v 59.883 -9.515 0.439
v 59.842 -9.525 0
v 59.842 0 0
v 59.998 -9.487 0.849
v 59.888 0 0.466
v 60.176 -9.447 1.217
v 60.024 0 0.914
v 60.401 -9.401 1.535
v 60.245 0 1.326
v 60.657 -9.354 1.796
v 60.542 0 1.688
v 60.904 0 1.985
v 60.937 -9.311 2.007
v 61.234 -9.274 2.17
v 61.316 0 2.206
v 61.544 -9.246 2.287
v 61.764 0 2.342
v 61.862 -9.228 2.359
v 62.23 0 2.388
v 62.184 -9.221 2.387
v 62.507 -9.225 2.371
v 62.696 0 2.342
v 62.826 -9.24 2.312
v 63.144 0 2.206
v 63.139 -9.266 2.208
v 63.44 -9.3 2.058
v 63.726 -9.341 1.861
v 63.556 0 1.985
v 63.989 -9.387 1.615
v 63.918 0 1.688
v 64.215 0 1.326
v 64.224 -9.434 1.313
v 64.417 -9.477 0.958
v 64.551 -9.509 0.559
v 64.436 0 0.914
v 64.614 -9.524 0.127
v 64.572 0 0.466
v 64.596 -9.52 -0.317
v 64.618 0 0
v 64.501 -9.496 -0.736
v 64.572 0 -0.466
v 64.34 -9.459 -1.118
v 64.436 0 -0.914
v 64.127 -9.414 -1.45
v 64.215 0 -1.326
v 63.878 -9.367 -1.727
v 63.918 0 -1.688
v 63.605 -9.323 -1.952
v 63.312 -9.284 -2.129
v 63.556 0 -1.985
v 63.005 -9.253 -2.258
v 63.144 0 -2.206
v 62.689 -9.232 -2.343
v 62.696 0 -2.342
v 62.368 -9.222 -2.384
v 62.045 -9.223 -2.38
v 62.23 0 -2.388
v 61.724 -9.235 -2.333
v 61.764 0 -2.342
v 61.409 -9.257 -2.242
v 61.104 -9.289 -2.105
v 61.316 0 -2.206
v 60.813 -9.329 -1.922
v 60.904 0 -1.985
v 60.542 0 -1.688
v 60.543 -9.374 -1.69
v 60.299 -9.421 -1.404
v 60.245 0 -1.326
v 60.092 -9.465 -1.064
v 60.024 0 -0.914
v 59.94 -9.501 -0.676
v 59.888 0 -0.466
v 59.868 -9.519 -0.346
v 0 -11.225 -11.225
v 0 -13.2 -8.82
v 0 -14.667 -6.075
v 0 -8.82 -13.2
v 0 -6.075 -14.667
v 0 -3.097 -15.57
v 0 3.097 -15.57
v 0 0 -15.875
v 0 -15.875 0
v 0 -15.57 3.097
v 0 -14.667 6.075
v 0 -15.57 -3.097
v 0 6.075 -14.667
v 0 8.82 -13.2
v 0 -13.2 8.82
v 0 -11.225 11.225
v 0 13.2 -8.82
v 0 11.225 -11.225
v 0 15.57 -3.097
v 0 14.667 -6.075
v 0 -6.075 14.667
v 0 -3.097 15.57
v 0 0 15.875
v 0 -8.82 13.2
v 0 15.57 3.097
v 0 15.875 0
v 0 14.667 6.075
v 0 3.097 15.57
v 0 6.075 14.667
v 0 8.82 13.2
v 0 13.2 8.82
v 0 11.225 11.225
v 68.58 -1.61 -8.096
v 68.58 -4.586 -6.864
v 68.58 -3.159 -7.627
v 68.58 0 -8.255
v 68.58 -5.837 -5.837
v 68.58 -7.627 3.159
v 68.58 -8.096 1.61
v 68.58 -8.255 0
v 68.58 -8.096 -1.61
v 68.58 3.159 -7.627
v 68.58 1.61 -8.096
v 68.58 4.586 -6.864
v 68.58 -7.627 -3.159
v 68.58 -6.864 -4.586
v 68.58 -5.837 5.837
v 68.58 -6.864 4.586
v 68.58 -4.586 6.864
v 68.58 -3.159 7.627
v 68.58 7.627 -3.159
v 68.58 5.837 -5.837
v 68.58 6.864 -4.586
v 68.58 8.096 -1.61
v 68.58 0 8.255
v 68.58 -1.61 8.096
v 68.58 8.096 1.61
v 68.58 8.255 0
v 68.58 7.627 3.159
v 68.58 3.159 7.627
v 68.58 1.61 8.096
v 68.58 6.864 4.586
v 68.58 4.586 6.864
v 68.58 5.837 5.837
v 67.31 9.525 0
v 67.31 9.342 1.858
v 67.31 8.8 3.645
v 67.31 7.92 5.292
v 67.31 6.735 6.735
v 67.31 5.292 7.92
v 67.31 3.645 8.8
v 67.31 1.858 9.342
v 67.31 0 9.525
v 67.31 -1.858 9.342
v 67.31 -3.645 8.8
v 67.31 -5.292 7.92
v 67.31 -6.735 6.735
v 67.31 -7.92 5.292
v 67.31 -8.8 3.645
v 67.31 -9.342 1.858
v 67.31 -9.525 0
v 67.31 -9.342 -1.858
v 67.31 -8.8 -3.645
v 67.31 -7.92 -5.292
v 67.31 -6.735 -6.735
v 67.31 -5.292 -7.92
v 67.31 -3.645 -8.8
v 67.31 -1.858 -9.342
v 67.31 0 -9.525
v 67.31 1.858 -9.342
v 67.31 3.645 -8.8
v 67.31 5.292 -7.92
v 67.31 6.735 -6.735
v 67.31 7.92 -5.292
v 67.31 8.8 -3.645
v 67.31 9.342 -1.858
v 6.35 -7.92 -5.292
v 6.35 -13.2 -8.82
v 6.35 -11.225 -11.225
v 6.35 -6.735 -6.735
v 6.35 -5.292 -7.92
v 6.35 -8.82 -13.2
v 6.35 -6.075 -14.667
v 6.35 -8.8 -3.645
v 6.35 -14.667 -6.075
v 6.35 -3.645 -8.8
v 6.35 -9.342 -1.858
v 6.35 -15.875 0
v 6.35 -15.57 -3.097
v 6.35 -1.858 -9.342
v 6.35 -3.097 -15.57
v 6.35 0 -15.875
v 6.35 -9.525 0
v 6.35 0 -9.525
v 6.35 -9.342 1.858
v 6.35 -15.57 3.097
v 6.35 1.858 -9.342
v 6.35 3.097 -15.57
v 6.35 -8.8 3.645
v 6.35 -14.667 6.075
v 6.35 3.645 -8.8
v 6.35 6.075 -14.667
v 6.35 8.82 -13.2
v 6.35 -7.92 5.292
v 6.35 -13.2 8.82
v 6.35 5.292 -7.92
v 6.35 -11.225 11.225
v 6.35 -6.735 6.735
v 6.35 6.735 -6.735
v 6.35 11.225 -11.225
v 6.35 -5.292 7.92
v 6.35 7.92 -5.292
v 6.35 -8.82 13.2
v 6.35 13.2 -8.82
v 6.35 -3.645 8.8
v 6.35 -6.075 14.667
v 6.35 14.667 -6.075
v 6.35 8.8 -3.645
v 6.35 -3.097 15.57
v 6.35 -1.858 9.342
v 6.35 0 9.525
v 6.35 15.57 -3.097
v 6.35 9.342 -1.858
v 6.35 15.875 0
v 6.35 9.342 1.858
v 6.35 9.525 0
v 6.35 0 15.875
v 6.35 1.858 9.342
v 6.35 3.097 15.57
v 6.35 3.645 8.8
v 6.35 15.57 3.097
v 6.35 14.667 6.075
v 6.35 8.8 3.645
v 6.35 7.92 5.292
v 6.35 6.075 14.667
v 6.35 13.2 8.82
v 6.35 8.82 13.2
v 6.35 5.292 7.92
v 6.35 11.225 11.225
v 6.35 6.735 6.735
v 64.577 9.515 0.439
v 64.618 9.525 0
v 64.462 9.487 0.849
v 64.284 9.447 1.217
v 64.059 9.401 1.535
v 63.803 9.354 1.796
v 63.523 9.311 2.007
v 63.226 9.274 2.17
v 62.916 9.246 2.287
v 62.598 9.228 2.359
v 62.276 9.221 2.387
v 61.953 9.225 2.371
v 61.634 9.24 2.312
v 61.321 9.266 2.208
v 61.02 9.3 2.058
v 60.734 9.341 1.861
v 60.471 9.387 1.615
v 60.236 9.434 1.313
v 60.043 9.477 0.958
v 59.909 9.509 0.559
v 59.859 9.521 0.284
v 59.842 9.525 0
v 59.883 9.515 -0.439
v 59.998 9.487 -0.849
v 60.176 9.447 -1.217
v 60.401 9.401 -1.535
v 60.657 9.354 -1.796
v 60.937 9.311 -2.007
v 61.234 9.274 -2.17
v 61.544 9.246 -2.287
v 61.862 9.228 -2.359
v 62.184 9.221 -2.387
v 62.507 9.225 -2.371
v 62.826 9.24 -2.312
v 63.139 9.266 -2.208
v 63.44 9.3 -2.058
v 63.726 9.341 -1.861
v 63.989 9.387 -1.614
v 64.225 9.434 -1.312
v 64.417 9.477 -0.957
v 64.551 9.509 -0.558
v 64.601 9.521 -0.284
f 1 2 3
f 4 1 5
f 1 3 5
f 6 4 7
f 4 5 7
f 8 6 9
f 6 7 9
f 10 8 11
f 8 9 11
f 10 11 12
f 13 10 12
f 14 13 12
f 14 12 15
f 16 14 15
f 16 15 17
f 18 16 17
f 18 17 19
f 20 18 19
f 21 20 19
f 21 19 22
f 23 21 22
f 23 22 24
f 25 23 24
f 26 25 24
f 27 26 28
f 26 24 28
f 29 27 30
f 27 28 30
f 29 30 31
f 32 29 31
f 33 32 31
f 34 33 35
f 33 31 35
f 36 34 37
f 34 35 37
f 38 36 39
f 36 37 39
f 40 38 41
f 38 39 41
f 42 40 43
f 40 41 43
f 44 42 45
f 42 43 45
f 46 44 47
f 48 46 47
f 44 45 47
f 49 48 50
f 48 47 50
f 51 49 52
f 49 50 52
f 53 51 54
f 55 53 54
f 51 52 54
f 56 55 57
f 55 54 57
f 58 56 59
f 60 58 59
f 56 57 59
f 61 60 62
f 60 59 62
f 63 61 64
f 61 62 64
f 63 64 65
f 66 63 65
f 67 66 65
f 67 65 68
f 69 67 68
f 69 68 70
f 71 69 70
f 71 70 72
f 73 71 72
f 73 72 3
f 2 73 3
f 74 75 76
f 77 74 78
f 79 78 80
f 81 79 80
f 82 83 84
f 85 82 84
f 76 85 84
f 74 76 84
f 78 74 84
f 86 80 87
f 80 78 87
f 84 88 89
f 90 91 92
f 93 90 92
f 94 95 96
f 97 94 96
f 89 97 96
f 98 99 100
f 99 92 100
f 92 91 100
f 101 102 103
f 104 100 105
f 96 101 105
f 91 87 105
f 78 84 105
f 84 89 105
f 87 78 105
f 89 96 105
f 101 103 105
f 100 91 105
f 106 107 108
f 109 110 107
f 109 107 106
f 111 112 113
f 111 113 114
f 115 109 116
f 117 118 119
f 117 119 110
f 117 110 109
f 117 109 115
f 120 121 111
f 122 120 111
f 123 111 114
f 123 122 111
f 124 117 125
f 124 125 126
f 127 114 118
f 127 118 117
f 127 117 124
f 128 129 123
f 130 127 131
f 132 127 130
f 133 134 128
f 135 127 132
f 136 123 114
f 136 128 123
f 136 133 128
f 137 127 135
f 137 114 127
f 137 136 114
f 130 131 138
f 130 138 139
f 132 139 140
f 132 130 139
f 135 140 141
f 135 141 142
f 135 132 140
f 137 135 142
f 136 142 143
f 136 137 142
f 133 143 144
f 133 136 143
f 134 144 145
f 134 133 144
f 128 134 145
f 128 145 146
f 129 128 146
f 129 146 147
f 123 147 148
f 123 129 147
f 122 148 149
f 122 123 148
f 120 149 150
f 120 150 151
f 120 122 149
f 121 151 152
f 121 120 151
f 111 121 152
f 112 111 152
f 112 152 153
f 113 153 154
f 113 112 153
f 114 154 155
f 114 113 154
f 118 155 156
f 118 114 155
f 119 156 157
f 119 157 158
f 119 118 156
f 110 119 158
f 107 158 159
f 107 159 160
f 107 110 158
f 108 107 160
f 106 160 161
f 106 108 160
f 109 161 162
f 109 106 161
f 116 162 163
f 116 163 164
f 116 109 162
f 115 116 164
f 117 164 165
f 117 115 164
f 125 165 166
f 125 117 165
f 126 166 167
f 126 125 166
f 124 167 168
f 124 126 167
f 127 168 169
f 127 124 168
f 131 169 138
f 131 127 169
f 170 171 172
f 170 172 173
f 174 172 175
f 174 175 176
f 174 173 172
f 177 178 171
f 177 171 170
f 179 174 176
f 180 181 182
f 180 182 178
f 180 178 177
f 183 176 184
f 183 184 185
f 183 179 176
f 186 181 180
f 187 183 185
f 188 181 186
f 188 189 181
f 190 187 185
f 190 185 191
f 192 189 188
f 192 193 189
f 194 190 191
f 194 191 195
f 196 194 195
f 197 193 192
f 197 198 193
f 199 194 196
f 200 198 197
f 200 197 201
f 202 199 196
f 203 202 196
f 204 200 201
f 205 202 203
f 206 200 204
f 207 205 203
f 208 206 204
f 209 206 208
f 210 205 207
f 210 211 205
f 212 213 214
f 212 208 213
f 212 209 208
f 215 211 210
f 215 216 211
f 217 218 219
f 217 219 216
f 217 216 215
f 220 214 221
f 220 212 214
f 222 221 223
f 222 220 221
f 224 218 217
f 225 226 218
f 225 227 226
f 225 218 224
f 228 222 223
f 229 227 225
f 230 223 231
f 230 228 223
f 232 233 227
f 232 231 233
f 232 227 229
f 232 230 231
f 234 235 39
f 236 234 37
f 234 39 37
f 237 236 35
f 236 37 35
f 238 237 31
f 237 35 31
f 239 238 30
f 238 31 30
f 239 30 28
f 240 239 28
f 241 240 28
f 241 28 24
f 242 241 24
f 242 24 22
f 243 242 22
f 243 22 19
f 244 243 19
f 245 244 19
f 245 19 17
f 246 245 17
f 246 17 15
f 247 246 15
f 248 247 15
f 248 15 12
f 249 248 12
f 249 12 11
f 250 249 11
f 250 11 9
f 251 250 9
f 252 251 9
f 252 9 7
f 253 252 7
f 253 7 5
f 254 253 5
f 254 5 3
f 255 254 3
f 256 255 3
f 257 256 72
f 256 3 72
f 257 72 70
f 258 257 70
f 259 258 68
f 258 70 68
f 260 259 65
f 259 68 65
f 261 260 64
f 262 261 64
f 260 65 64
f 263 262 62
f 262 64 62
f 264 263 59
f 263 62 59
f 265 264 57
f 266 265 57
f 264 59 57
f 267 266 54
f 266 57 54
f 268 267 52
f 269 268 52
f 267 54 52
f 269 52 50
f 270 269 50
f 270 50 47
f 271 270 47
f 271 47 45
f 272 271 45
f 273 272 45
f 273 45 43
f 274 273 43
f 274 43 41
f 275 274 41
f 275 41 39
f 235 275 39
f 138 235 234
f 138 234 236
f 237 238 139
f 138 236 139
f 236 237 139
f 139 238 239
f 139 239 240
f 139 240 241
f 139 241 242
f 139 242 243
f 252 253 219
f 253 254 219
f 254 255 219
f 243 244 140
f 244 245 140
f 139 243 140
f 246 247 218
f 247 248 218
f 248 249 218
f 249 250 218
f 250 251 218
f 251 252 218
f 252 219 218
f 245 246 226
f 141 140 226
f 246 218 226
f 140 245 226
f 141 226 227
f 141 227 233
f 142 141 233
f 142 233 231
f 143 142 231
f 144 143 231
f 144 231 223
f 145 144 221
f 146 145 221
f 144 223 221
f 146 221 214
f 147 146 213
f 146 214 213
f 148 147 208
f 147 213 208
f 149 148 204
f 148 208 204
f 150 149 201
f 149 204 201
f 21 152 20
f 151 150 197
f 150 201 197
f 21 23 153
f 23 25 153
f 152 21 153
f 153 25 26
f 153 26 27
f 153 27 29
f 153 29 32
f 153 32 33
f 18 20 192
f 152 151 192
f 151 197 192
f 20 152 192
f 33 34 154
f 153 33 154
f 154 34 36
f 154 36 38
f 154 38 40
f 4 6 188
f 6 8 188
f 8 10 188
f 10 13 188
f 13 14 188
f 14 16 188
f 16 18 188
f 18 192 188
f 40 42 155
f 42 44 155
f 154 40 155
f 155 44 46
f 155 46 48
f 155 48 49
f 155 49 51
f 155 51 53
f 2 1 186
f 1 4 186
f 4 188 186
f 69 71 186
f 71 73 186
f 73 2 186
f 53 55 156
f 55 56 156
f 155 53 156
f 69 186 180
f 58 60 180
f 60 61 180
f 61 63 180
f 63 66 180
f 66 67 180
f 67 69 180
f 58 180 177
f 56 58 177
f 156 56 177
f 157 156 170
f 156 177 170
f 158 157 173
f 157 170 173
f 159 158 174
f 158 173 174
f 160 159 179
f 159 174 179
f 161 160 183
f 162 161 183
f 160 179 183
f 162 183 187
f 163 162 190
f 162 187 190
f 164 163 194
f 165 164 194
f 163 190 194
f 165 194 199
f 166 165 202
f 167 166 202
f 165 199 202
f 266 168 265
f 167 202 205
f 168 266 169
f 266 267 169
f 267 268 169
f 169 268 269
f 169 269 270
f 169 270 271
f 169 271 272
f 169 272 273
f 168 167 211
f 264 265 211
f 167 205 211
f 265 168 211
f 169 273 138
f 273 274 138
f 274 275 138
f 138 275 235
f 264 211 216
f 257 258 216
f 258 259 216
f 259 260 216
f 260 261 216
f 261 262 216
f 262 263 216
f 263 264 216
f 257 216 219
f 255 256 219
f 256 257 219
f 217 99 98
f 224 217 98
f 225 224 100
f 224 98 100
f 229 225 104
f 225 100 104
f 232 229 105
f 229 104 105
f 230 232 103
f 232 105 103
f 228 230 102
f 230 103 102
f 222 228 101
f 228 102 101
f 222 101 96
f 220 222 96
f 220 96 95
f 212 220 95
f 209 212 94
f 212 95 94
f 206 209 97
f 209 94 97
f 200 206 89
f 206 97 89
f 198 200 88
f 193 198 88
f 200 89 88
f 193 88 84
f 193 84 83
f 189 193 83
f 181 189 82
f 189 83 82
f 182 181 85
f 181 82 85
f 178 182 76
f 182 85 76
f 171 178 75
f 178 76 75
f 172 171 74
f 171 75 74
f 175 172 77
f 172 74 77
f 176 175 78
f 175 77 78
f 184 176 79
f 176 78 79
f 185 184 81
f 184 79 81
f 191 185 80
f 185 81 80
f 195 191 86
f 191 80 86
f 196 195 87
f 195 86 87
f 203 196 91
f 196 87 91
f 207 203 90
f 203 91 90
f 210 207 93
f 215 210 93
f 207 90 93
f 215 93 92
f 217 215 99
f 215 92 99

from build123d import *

# Parameters (mm, degrees)
F0_R     = 15.875
F1_DEPTH = 6.35
F2_R     = 9.525
F3_DEPTH = 62.23
F4_SIZE  = 1.27
F5_R     = 2.3876
F6_DEPTH = 15.876
F7_R     = 2.3876
F8_DEPTH = 15.876


with BuildPart() as f1:
    # F0 (on Right) → F1 (new body)
    with BuildSketch(Plane.YZ):
        Circle(F0_R)
    extrude(amount=F1_DEPTH)

    # F2 (on face) → F3 (join)
    with BuildSketch(Plane.YZ.offset(6.35)):
        Circle(F2_R)
    extrude(amount=F3_DEPTH)

    # F4
    f4_edges = [f1.edges().sort_by_distance(p)[0] for p in [
        (68.58, -9.525, 0),
    ]]
    chamfer(f4_edges, length=F4_SIZE)

    # F5 (on Front) → F6 (cut, through all)
    with BuildSketch(Plane.XZ):
        with Locations((62.23, 0)):
            Circle(F5_R)
    extrude(amount=-F6_DEPTH, mode=Mode.SUBTRACT)

    # F7 (on face) → F8 (cut, through all)
    with BuildSketch(Plane(origin=(0, 0, 0), x_dir=(-1, 0, 0), z_dir=(0, 1, 0))):
        with Locations((-62.23, 0)):
            Circle(F7_R)
    extrude(amount=-F8_DEPTH, mode=Mode.SUBTRACT)


solid = f1.part
